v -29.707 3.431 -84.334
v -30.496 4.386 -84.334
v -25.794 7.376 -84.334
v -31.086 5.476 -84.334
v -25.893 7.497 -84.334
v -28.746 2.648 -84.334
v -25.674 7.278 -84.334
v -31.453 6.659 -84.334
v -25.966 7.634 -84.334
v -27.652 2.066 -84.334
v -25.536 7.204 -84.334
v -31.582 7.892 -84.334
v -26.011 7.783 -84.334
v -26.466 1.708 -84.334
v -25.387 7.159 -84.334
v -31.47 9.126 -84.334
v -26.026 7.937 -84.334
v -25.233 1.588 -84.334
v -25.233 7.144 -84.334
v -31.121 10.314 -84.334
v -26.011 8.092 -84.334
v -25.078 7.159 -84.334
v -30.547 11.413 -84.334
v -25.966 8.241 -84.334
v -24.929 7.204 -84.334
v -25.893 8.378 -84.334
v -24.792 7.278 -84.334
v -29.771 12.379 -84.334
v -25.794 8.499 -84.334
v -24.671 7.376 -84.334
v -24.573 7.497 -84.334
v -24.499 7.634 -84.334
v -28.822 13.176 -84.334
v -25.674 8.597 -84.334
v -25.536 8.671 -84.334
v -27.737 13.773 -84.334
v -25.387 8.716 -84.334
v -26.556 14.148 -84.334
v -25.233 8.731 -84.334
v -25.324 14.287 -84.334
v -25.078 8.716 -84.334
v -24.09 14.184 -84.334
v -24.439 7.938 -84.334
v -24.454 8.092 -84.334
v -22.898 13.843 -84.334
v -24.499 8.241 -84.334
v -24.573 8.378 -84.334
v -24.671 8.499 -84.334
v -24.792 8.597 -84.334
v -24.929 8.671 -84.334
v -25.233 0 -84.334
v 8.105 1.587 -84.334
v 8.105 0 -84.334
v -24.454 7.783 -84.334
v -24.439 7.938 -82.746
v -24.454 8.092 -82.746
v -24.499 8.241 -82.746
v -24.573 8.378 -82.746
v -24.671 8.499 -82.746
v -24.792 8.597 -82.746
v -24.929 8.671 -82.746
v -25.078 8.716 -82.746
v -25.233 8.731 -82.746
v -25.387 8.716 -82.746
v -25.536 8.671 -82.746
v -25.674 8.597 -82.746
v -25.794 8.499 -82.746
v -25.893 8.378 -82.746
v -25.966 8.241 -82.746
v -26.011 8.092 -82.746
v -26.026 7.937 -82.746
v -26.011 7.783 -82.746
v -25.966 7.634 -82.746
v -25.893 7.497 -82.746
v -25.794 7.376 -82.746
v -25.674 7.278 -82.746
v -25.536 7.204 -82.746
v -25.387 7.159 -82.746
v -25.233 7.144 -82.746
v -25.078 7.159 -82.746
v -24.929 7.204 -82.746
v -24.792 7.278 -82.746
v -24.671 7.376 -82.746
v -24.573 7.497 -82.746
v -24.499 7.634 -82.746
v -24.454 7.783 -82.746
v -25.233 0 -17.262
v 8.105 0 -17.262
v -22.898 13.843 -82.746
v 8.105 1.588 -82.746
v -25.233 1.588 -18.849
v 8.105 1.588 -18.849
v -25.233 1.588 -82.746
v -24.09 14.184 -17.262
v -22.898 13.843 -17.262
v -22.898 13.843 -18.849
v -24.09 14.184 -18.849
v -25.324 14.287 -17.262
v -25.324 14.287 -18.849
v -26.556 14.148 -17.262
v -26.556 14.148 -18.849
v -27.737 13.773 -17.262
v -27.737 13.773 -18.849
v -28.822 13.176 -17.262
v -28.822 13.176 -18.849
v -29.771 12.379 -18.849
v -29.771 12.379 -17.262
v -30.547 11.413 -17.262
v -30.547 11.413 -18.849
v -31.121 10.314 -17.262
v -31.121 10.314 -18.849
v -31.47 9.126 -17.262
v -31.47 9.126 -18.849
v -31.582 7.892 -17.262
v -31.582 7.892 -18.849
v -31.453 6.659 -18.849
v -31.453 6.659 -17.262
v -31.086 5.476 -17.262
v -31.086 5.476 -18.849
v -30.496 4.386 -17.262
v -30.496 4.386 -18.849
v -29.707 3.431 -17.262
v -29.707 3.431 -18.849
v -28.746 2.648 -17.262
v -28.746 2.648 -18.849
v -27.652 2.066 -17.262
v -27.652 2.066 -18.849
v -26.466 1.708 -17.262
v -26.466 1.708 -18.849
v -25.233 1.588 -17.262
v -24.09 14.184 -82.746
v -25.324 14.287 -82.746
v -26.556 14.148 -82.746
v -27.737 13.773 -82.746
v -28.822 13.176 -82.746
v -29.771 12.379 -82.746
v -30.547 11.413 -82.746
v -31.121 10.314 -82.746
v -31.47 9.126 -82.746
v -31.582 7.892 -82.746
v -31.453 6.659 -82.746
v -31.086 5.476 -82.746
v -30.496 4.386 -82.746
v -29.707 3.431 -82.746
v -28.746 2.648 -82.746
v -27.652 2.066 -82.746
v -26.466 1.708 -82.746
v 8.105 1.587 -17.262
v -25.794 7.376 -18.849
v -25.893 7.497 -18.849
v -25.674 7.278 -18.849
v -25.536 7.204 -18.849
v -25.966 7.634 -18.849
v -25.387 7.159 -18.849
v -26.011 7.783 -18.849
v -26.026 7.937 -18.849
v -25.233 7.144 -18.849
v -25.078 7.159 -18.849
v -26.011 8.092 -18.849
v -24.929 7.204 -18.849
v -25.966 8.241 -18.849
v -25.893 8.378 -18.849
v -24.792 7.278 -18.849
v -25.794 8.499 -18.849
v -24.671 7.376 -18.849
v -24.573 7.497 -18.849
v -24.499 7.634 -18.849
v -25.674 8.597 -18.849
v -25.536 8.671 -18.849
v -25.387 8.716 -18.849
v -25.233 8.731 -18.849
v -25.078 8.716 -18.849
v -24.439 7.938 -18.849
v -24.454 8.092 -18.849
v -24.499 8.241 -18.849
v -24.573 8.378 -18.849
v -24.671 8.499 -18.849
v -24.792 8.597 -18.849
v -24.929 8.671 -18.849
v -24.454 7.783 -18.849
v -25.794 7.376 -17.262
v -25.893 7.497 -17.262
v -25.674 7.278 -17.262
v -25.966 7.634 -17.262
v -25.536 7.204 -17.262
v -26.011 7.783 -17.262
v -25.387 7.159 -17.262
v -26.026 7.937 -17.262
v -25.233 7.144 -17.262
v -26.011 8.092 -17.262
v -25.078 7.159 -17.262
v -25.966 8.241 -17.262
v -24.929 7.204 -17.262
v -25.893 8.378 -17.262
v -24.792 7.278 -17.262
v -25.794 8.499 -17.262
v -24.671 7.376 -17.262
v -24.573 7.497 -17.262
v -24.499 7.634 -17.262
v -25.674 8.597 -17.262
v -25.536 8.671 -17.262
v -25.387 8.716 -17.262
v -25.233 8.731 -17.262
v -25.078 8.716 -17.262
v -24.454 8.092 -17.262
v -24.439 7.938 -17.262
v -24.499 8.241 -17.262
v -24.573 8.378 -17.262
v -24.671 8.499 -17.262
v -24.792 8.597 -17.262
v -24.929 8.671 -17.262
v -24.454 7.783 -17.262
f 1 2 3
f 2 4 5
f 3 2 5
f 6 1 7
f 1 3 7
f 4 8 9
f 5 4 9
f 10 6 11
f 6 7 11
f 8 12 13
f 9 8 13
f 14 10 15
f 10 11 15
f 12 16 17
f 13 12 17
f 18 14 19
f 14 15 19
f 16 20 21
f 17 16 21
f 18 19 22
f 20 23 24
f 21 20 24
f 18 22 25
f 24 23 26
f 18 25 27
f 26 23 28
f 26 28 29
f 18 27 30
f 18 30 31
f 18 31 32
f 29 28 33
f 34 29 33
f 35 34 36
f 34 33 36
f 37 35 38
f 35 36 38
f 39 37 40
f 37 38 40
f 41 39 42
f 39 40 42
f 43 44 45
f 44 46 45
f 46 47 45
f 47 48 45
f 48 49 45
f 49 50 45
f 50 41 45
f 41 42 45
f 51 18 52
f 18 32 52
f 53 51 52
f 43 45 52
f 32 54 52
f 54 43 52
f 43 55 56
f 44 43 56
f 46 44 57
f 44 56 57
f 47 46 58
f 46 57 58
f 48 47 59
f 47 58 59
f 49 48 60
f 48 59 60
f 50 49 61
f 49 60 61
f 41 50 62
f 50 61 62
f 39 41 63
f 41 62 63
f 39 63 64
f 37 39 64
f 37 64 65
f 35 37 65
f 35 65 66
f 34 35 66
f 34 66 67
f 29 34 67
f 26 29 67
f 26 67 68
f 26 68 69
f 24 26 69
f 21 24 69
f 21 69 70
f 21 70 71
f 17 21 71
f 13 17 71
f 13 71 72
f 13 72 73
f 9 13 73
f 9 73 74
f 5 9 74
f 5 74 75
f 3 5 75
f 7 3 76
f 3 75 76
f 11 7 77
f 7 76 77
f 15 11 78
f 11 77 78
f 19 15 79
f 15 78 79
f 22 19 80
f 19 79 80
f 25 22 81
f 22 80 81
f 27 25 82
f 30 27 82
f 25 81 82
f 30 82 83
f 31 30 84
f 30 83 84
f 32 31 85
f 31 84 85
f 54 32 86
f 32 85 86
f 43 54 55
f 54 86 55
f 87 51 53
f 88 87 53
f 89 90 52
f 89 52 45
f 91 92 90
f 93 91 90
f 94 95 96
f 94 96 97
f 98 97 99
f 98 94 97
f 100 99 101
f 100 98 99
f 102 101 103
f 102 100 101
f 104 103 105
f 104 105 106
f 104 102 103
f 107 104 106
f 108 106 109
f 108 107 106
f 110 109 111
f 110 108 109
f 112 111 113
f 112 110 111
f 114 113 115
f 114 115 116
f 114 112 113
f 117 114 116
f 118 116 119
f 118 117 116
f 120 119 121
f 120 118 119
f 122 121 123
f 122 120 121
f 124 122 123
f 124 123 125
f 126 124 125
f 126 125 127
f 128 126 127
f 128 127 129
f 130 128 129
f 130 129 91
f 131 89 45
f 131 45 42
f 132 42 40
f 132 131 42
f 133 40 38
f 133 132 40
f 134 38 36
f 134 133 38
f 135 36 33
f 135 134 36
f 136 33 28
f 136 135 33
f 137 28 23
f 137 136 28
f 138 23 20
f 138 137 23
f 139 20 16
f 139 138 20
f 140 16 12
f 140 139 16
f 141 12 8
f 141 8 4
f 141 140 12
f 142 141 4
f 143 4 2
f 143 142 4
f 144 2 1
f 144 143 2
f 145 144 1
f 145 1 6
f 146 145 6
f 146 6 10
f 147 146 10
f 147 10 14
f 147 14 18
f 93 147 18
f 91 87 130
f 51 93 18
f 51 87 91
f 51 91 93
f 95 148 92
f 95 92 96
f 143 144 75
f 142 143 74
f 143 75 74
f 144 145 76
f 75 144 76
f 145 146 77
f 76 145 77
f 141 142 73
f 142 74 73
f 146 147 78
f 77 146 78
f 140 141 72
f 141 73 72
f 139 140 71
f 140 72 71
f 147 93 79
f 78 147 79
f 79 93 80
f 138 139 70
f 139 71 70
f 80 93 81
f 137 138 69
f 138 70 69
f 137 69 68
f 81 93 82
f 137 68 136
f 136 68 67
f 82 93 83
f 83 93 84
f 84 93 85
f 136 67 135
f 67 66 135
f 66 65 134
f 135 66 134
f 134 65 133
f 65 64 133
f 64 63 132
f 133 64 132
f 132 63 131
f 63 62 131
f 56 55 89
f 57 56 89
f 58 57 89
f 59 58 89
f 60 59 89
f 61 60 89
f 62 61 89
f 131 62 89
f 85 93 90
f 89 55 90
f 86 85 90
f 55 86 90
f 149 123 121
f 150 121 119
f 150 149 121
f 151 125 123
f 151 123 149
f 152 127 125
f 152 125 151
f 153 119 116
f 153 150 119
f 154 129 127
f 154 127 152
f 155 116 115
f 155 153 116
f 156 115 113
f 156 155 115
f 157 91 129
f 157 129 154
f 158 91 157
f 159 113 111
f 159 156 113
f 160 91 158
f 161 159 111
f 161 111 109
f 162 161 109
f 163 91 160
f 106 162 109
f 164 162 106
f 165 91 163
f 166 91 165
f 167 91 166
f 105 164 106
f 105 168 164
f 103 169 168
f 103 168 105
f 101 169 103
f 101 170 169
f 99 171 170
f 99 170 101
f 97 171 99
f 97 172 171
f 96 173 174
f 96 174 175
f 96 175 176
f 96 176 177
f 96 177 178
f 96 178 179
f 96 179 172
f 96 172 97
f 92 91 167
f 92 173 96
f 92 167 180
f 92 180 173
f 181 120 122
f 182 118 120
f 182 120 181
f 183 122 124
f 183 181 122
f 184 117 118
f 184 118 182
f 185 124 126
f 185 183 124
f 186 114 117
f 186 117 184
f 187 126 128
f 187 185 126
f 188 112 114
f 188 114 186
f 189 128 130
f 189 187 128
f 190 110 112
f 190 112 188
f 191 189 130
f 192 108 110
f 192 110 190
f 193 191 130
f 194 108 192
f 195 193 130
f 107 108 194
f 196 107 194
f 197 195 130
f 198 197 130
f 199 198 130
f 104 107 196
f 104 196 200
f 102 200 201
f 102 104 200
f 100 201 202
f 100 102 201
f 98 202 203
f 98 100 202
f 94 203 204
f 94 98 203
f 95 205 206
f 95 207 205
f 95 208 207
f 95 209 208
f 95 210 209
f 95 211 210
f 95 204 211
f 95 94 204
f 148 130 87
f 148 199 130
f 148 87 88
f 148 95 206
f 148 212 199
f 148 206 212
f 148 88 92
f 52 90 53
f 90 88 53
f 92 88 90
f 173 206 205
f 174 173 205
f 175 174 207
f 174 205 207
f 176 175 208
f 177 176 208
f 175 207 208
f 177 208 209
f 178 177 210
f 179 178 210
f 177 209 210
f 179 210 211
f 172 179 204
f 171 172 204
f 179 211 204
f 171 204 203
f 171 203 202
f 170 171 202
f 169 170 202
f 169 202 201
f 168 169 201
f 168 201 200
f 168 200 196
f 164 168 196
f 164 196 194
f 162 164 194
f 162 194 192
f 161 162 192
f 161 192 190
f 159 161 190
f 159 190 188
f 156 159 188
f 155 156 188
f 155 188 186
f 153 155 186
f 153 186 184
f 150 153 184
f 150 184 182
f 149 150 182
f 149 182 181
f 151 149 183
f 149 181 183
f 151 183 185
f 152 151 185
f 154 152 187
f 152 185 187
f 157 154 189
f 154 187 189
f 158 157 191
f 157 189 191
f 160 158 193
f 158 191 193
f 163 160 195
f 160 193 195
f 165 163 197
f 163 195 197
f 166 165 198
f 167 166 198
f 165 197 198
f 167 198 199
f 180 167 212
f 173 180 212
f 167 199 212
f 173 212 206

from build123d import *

# Parameters (mm, degrees)
SKETCH2_W           = 33.3375
SKETCH2_H           = 67.071875
BOSS_EXTRUDE1_DEPTH = 1.5875
SKETCH3_R           = 0.79375
BOSS_EXTRUDE2_DEPTH = 67.071875
SKETCH4_W           = 63.896875
SKETCH4_H           = 12.7
CUT_EXTRUDE1_DEPTH  = 40.6875


with BuildPart() as part:
    # Sketch2 → Boss-Extrude1 (new body)
    with BuildSketch(Plane(origin=(0, 0, 0), x_dir=(1, 0, 0), z_dir=(0, 1, 0))):
        with Locations((-8.563888889, 50.797800926)):
            Rectangle(SKETCH2_W, SKETCH2_H)
    extrude(amount=BOSS_EXTRUDE1_DEPTH)

    # Sketch3 → Boss-Extrude2 (add)
    with BuildSketch(Plane.XY.offset(-17.261863426)):
        with BuildLine():
            Line((-25.232638889, 1.5875), (8.104861111, 1.5875))
            Line((8.104861111, 1.5875), (-22.898284403, 13.84286105))
            ThreePointArc((-22.898284403, 13.84286105), (-31.470488786, 9.125661885), (-25.232638889, 1.5875))
        make_face()
        with Locations((-25.232638889, 7.9375)):
            Circle(SKETCH3_R, mode=Mode.SUBTRACT)
    extrude(amount=-BOSS_EXTRUDE2_DEPTH)

    # Sketch4 → Cut-Extrude1 (cut, through all)
    with BuildSketch(Plane(origin=(8.104861111, 0, 0), x_dir=(0, 0, -1), z_dir=(1, 0, 0))):
        with Locations((50.797800926, 7.9375)):
            Rectangle(SKETCH4_W, SKETCH4_H)
    extrude(amount=-CUT_EXTRUDE1_DEPTH, mode=Mode.SUBTRACT)


solid = part.part
